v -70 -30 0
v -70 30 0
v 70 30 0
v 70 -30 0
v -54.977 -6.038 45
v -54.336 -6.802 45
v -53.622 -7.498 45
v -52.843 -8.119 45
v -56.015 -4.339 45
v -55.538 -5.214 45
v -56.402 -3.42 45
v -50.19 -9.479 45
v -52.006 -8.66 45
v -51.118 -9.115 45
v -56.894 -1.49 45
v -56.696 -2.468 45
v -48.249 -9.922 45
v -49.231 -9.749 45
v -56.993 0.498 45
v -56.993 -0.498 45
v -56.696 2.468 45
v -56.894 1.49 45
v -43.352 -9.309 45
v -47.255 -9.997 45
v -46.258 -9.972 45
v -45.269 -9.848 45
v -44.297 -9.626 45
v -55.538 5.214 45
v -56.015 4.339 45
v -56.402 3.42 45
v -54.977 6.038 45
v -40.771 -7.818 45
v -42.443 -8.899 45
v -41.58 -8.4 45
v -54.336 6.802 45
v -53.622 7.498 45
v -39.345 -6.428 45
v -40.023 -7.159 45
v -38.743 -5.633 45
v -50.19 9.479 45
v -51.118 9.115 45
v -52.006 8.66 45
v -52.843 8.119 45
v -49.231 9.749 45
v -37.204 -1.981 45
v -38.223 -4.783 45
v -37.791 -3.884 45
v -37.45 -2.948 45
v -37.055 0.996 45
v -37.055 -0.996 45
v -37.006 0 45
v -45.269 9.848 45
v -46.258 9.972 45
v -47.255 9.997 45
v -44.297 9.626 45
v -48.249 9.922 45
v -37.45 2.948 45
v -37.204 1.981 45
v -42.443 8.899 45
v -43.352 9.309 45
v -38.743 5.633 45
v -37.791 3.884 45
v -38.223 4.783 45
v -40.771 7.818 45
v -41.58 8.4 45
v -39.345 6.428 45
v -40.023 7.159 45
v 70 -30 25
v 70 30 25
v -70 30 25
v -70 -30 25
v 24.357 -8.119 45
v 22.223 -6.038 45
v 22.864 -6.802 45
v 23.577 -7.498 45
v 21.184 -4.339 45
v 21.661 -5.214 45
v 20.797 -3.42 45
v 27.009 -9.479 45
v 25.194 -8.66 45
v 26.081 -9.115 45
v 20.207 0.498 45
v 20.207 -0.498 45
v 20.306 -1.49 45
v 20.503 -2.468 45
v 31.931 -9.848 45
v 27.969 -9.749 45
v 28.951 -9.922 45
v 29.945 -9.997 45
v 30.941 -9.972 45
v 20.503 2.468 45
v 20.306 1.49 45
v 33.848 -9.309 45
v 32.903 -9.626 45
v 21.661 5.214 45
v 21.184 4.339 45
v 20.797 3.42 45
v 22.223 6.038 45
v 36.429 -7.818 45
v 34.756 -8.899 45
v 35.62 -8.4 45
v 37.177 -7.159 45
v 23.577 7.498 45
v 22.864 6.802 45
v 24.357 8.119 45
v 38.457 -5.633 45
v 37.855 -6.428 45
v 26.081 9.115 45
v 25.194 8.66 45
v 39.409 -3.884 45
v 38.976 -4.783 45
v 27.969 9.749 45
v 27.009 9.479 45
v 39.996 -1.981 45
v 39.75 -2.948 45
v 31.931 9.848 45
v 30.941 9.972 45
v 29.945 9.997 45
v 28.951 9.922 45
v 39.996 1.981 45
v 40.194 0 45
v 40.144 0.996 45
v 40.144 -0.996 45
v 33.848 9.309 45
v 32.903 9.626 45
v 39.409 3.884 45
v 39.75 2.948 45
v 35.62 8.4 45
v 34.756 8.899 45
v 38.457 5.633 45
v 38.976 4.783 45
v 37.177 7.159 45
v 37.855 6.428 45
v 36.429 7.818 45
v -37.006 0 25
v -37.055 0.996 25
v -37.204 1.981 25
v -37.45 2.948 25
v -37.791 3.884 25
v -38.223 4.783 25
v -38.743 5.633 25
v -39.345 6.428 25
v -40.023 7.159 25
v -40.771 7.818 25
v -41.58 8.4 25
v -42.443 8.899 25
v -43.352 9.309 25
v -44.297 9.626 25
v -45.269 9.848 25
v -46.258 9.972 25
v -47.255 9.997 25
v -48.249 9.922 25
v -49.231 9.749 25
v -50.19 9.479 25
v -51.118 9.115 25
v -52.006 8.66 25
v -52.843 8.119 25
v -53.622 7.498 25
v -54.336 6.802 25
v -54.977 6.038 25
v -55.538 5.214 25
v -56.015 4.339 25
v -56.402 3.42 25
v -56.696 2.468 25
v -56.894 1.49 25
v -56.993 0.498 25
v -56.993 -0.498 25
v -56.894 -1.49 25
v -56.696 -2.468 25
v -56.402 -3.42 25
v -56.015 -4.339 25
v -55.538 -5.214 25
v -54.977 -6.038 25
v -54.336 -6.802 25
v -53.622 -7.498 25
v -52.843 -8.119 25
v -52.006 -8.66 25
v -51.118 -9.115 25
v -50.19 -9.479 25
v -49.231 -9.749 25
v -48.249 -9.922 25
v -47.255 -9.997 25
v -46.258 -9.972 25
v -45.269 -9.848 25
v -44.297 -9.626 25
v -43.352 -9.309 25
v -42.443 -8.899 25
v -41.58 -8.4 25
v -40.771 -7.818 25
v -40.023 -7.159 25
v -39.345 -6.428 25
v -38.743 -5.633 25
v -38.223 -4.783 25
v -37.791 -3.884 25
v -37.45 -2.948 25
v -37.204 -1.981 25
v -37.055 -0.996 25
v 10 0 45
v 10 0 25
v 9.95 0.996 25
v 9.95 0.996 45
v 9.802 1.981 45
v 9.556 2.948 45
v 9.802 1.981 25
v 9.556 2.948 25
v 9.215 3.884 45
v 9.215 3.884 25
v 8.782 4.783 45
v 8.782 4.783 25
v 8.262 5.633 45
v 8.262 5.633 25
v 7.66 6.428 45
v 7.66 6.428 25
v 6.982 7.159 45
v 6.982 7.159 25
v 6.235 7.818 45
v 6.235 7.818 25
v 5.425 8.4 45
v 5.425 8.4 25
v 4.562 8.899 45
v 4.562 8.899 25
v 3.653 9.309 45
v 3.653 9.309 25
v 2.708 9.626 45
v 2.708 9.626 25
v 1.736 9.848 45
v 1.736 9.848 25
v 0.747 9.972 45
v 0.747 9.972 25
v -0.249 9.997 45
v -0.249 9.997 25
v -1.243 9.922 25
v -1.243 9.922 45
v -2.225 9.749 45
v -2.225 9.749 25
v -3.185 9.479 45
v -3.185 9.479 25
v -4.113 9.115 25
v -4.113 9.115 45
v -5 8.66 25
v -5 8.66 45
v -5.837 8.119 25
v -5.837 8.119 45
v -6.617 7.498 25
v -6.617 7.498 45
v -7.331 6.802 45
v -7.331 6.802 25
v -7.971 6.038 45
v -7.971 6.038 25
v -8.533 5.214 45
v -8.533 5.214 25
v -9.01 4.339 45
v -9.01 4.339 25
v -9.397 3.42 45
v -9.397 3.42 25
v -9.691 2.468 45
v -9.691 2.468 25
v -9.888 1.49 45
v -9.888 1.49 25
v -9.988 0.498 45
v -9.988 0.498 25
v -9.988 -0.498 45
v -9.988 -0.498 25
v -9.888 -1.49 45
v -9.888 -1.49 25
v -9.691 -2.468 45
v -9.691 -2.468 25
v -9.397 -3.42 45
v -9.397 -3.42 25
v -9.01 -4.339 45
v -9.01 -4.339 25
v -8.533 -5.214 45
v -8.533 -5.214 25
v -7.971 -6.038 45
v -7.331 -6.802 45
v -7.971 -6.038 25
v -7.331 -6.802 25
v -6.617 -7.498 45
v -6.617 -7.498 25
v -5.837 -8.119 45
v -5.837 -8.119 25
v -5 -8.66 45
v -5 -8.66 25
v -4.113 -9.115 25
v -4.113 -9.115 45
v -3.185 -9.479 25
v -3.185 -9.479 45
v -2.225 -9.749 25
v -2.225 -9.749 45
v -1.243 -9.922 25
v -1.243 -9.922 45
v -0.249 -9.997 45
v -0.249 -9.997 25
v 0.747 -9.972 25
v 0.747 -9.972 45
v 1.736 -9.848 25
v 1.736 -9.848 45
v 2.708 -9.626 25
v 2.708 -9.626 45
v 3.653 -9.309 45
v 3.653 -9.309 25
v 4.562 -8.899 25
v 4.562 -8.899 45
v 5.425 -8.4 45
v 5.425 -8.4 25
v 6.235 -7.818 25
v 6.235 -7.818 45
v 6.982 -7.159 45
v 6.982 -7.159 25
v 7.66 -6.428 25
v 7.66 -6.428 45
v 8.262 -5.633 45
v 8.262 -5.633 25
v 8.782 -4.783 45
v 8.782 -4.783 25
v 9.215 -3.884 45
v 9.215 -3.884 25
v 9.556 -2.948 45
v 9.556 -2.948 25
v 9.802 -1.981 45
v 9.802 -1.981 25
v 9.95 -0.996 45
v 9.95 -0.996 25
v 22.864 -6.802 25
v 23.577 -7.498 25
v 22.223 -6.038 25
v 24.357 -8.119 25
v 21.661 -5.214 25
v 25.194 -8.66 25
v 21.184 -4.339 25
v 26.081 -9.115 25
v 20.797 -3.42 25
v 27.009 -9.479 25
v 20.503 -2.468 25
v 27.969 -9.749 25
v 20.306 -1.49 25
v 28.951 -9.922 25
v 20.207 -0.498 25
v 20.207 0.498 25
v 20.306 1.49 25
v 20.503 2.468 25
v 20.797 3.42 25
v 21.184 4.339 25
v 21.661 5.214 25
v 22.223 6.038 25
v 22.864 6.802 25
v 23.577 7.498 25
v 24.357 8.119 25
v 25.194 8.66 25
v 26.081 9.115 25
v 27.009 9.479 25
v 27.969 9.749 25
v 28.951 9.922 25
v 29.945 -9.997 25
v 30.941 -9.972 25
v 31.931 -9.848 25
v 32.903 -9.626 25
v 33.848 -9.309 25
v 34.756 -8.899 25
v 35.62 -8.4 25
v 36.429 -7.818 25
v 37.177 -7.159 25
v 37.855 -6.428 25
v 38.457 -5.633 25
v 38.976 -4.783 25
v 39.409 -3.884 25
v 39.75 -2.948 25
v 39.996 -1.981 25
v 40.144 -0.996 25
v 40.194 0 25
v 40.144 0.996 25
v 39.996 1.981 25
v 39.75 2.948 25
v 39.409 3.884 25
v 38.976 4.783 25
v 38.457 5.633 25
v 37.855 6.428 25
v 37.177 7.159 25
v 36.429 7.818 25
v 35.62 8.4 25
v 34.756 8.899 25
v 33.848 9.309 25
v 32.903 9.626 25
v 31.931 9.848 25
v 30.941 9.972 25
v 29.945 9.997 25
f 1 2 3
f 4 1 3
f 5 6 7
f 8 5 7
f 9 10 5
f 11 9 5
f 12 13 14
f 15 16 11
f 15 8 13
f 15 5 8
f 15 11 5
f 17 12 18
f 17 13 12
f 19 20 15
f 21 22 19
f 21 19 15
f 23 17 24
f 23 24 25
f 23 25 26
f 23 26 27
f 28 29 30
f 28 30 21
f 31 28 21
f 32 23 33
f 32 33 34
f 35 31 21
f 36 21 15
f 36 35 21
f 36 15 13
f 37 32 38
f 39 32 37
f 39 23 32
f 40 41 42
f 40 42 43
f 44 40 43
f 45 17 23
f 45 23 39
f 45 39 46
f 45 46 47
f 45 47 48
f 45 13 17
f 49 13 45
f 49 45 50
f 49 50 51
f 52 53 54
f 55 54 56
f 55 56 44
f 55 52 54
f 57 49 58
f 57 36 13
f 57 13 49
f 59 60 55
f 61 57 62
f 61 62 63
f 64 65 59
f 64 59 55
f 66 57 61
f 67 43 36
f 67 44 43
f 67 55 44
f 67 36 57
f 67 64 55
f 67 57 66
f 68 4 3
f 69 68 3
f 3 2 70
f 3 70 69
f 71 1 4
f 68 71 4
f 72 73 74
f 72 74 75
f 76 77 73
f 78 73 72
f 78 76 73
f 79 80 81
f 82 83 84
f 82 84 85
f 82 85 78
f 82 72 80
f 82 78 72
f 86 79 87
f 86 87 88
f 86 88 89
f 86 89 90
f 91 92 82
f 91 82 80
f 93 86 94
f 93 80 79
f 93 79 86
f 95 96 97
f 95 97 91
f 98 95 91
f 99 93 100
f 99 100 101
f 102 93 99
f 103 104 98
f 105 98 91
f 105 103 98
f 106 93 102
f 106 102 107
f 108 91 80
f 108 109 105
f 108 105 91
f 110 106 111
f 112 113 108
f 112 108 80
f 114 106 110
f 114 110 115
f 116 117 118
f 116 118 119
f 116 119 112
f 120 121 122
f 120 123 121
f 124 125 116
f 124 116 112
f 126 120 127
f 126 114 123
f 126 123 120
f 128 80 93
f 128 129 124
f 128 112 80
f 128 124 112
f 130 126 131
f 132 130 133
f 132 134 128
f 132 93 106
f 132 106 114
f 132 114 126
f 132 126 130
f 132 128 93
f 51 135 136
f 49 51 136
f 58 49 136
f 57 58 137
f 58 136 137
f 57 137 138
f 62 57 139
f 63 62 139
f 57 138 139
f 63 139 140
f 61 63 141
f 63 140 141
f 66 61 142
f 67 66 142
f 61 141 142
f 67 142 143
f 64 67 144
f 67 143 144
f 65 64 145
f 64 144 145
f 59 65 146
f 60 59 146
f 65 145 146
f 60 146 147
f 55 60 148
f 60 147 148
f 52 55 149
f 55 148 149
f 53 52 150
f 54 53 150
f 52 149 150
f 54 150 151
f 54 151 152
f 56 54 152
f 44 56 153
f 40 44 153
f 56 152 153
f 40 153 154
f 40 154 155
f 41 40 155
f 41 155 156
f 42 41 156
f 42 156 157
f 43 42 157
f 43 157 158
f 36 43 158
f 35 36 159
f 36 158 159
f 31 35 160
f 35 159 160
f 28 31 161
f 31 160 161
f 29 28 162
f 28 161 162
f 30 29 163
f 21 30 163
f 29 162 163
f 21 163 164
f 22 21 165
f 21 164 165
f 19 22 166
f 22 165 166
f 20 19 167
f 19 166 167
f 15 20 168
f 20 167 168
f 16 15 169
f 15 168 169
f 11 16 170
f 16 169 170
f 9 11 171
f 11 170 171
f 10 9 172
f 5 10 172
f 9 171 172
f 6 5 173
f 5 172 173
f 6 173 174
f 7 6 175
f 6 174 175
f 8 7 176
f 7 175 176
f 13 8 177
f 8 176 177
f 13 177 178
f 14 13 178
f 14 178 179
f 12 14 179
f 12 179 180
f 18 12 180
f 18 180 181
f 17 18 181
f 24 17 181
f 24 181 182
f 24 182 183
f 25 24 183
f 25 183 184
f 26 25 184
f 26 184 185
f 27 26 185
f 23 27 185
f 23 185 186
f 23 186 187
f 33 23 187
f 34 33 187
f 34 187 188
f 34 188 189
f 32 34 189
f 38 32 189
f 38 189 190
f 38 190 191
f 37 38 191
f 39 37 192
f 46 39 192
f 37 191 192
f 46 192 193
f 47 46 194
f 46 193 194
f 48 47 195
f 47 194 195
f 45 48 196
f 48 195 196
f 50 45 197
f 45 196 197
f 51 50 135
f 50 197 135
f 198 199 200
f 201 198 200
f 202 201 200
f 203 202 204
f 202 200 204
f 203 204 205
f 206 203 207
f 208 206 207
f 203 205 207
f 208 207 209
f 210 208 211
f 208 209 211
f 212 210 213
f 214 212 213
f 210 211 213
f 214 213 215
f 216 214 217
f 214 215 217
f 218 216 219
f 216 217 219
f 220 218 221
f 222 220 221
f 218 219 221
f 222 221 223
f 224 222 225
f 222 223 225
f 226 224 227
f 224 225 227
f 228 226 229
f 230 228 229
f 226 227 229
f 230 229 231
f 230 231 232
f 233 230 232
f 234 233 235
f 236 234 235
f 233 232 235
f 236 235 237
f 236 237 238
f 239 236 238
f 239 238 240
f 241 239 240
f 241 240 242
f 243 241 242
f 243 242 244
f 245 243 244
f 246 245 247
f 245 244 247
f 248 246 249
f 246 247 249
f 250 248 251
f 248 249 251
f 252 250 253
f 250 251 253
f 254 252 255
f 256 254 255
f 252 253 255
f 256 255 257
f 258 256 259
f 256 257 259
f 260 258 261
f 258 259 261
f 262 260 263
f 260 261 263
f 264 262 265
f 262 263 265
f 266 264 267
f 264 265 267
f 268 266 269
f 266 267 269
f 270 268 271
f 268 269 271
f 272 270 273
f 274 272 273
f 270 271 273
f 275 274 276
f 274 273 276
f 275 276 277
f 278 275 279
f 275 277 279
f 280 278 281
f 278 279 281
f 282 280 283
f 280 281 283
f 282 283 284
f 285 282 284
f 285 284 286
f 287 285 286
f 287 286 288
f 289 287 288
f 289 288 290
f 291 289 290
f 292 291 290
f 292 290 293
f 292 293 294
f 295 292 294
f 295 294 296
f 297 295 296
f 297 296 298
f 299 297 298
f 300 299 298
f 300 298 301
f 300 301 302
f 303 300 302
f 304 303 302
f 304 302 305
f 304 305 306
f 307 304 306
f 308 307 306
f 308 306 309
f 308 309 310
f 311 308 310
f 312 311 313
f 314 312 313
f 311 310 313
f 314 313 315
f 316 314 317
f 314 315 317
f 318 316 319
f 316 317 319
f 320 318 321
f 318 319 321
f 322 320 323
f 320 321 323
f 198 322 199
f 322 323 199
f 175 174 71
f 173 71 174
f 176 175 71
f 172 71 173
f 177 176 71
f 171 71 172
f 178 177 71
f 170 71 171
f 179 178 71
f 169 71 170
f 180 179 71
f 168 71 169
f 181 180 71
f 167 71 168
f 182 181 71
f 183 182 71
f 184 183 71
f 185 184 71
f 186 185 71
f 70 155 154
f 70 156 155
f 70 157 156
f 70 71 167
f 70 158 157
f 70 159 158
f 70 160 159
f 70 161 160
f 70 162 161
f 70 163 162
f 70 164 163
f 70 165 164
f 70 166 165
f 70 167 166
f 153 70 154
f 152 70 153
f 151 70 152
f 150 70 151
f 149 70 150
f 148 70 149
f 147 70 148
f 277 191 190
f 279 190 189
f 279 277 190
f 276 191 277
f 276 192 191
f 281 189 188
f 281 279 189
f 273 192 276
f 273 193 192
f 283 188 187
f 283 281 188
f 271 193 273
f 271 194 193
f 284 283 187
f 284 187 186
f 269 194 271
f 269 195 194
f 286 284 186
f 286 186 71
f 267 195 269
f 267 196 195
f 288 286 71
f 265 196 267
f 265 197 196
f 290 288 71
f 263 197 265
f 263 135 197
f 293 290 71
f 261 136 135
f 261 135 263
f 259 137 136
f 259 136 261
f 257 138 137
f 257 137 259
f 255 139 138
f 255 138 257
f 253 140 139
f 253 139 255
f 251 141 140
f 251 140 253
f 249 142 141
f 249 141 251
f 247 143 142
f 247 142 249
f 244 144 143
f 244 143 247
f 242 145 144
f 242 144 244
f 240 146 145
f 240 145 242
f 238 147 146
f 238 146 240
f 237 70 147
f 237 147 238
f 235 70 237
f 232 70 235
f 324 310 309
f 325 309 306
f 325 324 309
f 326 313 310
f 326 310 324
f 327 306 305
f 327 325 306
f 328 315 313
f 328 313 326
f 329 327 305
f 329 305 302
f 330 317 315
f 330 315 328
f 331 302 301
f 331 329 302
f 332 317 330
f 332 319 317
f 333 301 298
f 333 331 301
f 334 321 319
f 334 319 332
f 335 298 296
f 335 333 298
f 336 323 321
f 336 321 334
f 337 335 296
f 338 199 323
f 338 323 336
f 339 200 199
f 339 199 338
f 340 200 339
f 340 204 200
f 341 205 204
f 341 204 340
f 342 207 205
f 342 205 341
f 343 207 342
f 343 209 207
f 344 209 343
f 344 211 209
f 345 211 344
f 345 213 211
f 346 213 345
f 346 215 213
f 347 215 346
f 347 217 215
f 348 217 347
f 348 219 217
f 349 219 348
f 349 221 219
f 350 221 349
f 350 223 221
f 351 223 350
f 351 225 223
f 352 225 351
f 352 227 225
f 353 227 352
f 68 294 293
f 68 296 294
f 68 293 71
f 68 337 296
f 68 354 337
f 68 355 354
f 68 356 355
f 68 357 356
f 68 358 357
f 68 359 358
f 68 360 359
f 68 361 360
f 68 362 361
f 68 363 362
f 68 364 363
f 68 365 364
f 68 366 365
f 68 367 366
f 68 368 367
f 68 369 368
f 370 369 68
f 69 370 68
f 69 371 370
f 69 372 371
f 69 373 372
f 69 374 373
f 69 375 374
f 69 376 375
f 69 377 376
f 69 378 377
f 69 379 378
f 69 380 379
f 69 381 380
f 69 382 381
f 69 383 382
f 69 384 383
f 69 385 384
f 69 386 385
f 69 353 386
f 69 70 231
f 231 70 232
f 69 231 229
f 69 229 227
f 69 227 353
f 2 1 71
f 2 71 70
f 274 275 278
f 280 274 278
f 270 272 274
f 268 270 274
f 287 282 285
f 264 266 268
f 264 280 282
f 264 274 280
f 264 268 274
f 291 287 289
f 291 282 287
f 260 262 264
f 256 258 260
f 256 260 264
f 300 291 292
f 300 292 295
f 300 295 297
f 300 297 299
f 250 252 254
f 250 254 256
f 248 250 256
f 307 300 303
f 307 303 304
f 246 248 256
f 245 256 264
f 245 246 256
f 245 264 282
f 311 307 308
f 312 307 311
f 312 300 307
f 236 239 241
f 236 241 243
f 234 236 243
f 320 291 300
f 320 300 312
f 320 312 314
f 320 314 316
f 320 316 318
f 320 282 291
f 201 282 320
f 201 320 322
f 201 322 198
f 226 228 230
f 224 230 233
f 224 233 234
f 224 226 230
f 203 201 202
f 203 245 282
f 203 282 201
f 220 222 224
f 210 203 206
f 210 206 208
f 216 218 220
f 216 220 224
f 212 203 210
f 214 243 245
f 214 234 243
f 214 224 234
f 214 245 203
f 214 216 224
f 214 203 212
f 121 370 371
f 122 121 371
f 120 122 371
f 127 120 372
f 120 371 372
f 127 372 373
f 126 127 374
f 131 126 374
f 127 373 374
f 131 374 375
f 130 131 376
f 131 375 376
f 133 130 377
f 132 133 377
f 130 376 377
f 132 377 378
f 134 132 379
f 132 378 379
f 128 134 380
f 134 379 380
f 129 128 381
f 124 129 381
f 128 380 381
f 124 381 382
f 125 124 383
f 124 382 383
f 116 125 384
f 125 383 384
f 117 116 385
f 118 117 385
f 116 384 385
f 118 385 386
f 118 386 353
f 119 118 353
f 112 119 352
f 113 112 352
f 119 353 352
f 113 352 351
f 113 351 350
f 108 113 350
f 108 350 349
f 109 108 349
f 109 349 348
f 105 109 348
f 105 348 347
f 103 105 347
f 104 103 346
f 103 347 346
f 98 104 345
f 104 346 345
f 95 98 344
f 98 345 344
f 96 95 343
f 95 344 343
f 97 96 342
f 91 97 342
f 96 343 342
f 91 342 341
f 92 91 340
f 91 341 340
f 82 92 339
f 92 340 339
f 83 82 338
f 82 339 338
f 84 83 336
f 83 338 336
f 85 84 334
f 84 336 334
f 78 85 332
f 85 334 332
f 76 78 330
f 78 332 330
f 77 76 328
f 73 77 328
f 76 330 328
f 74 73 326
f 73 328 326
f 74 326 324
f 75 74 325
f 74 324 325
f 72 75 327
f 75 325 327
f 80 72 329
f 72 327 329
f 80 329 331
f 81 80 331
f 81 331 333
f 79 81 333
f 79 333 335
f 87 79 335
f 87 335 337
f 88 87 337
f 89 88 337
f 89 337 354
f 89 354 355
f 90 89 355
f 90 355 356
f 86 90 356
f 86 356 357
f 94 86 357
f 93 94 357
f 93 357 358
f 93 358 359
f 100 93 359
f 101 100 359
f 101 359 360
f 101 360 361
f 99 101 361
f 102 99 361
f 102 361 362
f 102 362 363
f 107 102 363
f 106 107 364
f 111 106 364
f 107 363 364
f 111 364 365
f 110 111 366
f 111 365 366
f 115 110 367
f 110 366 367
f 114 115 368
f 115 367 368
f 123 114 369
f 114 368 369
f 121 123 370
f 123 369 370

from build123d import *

# Parameters (mm, degrees)
F0_W     = 140
F0_H     = 60
F1_DEPTH = 25
F2_R     = 10
F5_DEPTH = 20
F3_R     = 10
F6_DEPTH = 20
F4_R     = 10
F7_DEPTH = 20


with BuildPart() as f1:
    # F0 (on Top) → F1 (new body)
    with BuildSketch(Plane.XY):
        Rectangle(F0_W, F0_H)
    extrude(amount=F1_DEPTH)

    # F2 (on face) → F5 (join)
    with BuildSketch(Plane.XY.offset(25)):
        with Locations((-47.00553, 0)):
            Circle(F2_R)
    extrude(amount=F5_DEPTH)

    # F3 (on face) → F6 (join)
    with BuildSketch(Plane.XY.offset(25)):
        Circle(F3_R)
    extrude(amount=F6_DEPTH)

    # F4 (on face) → F7 (join)
    with BuildSketch(Plane.XY.offset(25)):
        with Locations((30.194177, 0)):
            Circle(F4_R)
    extrude(amount=F7_DEPTH)


solid = f1.part
